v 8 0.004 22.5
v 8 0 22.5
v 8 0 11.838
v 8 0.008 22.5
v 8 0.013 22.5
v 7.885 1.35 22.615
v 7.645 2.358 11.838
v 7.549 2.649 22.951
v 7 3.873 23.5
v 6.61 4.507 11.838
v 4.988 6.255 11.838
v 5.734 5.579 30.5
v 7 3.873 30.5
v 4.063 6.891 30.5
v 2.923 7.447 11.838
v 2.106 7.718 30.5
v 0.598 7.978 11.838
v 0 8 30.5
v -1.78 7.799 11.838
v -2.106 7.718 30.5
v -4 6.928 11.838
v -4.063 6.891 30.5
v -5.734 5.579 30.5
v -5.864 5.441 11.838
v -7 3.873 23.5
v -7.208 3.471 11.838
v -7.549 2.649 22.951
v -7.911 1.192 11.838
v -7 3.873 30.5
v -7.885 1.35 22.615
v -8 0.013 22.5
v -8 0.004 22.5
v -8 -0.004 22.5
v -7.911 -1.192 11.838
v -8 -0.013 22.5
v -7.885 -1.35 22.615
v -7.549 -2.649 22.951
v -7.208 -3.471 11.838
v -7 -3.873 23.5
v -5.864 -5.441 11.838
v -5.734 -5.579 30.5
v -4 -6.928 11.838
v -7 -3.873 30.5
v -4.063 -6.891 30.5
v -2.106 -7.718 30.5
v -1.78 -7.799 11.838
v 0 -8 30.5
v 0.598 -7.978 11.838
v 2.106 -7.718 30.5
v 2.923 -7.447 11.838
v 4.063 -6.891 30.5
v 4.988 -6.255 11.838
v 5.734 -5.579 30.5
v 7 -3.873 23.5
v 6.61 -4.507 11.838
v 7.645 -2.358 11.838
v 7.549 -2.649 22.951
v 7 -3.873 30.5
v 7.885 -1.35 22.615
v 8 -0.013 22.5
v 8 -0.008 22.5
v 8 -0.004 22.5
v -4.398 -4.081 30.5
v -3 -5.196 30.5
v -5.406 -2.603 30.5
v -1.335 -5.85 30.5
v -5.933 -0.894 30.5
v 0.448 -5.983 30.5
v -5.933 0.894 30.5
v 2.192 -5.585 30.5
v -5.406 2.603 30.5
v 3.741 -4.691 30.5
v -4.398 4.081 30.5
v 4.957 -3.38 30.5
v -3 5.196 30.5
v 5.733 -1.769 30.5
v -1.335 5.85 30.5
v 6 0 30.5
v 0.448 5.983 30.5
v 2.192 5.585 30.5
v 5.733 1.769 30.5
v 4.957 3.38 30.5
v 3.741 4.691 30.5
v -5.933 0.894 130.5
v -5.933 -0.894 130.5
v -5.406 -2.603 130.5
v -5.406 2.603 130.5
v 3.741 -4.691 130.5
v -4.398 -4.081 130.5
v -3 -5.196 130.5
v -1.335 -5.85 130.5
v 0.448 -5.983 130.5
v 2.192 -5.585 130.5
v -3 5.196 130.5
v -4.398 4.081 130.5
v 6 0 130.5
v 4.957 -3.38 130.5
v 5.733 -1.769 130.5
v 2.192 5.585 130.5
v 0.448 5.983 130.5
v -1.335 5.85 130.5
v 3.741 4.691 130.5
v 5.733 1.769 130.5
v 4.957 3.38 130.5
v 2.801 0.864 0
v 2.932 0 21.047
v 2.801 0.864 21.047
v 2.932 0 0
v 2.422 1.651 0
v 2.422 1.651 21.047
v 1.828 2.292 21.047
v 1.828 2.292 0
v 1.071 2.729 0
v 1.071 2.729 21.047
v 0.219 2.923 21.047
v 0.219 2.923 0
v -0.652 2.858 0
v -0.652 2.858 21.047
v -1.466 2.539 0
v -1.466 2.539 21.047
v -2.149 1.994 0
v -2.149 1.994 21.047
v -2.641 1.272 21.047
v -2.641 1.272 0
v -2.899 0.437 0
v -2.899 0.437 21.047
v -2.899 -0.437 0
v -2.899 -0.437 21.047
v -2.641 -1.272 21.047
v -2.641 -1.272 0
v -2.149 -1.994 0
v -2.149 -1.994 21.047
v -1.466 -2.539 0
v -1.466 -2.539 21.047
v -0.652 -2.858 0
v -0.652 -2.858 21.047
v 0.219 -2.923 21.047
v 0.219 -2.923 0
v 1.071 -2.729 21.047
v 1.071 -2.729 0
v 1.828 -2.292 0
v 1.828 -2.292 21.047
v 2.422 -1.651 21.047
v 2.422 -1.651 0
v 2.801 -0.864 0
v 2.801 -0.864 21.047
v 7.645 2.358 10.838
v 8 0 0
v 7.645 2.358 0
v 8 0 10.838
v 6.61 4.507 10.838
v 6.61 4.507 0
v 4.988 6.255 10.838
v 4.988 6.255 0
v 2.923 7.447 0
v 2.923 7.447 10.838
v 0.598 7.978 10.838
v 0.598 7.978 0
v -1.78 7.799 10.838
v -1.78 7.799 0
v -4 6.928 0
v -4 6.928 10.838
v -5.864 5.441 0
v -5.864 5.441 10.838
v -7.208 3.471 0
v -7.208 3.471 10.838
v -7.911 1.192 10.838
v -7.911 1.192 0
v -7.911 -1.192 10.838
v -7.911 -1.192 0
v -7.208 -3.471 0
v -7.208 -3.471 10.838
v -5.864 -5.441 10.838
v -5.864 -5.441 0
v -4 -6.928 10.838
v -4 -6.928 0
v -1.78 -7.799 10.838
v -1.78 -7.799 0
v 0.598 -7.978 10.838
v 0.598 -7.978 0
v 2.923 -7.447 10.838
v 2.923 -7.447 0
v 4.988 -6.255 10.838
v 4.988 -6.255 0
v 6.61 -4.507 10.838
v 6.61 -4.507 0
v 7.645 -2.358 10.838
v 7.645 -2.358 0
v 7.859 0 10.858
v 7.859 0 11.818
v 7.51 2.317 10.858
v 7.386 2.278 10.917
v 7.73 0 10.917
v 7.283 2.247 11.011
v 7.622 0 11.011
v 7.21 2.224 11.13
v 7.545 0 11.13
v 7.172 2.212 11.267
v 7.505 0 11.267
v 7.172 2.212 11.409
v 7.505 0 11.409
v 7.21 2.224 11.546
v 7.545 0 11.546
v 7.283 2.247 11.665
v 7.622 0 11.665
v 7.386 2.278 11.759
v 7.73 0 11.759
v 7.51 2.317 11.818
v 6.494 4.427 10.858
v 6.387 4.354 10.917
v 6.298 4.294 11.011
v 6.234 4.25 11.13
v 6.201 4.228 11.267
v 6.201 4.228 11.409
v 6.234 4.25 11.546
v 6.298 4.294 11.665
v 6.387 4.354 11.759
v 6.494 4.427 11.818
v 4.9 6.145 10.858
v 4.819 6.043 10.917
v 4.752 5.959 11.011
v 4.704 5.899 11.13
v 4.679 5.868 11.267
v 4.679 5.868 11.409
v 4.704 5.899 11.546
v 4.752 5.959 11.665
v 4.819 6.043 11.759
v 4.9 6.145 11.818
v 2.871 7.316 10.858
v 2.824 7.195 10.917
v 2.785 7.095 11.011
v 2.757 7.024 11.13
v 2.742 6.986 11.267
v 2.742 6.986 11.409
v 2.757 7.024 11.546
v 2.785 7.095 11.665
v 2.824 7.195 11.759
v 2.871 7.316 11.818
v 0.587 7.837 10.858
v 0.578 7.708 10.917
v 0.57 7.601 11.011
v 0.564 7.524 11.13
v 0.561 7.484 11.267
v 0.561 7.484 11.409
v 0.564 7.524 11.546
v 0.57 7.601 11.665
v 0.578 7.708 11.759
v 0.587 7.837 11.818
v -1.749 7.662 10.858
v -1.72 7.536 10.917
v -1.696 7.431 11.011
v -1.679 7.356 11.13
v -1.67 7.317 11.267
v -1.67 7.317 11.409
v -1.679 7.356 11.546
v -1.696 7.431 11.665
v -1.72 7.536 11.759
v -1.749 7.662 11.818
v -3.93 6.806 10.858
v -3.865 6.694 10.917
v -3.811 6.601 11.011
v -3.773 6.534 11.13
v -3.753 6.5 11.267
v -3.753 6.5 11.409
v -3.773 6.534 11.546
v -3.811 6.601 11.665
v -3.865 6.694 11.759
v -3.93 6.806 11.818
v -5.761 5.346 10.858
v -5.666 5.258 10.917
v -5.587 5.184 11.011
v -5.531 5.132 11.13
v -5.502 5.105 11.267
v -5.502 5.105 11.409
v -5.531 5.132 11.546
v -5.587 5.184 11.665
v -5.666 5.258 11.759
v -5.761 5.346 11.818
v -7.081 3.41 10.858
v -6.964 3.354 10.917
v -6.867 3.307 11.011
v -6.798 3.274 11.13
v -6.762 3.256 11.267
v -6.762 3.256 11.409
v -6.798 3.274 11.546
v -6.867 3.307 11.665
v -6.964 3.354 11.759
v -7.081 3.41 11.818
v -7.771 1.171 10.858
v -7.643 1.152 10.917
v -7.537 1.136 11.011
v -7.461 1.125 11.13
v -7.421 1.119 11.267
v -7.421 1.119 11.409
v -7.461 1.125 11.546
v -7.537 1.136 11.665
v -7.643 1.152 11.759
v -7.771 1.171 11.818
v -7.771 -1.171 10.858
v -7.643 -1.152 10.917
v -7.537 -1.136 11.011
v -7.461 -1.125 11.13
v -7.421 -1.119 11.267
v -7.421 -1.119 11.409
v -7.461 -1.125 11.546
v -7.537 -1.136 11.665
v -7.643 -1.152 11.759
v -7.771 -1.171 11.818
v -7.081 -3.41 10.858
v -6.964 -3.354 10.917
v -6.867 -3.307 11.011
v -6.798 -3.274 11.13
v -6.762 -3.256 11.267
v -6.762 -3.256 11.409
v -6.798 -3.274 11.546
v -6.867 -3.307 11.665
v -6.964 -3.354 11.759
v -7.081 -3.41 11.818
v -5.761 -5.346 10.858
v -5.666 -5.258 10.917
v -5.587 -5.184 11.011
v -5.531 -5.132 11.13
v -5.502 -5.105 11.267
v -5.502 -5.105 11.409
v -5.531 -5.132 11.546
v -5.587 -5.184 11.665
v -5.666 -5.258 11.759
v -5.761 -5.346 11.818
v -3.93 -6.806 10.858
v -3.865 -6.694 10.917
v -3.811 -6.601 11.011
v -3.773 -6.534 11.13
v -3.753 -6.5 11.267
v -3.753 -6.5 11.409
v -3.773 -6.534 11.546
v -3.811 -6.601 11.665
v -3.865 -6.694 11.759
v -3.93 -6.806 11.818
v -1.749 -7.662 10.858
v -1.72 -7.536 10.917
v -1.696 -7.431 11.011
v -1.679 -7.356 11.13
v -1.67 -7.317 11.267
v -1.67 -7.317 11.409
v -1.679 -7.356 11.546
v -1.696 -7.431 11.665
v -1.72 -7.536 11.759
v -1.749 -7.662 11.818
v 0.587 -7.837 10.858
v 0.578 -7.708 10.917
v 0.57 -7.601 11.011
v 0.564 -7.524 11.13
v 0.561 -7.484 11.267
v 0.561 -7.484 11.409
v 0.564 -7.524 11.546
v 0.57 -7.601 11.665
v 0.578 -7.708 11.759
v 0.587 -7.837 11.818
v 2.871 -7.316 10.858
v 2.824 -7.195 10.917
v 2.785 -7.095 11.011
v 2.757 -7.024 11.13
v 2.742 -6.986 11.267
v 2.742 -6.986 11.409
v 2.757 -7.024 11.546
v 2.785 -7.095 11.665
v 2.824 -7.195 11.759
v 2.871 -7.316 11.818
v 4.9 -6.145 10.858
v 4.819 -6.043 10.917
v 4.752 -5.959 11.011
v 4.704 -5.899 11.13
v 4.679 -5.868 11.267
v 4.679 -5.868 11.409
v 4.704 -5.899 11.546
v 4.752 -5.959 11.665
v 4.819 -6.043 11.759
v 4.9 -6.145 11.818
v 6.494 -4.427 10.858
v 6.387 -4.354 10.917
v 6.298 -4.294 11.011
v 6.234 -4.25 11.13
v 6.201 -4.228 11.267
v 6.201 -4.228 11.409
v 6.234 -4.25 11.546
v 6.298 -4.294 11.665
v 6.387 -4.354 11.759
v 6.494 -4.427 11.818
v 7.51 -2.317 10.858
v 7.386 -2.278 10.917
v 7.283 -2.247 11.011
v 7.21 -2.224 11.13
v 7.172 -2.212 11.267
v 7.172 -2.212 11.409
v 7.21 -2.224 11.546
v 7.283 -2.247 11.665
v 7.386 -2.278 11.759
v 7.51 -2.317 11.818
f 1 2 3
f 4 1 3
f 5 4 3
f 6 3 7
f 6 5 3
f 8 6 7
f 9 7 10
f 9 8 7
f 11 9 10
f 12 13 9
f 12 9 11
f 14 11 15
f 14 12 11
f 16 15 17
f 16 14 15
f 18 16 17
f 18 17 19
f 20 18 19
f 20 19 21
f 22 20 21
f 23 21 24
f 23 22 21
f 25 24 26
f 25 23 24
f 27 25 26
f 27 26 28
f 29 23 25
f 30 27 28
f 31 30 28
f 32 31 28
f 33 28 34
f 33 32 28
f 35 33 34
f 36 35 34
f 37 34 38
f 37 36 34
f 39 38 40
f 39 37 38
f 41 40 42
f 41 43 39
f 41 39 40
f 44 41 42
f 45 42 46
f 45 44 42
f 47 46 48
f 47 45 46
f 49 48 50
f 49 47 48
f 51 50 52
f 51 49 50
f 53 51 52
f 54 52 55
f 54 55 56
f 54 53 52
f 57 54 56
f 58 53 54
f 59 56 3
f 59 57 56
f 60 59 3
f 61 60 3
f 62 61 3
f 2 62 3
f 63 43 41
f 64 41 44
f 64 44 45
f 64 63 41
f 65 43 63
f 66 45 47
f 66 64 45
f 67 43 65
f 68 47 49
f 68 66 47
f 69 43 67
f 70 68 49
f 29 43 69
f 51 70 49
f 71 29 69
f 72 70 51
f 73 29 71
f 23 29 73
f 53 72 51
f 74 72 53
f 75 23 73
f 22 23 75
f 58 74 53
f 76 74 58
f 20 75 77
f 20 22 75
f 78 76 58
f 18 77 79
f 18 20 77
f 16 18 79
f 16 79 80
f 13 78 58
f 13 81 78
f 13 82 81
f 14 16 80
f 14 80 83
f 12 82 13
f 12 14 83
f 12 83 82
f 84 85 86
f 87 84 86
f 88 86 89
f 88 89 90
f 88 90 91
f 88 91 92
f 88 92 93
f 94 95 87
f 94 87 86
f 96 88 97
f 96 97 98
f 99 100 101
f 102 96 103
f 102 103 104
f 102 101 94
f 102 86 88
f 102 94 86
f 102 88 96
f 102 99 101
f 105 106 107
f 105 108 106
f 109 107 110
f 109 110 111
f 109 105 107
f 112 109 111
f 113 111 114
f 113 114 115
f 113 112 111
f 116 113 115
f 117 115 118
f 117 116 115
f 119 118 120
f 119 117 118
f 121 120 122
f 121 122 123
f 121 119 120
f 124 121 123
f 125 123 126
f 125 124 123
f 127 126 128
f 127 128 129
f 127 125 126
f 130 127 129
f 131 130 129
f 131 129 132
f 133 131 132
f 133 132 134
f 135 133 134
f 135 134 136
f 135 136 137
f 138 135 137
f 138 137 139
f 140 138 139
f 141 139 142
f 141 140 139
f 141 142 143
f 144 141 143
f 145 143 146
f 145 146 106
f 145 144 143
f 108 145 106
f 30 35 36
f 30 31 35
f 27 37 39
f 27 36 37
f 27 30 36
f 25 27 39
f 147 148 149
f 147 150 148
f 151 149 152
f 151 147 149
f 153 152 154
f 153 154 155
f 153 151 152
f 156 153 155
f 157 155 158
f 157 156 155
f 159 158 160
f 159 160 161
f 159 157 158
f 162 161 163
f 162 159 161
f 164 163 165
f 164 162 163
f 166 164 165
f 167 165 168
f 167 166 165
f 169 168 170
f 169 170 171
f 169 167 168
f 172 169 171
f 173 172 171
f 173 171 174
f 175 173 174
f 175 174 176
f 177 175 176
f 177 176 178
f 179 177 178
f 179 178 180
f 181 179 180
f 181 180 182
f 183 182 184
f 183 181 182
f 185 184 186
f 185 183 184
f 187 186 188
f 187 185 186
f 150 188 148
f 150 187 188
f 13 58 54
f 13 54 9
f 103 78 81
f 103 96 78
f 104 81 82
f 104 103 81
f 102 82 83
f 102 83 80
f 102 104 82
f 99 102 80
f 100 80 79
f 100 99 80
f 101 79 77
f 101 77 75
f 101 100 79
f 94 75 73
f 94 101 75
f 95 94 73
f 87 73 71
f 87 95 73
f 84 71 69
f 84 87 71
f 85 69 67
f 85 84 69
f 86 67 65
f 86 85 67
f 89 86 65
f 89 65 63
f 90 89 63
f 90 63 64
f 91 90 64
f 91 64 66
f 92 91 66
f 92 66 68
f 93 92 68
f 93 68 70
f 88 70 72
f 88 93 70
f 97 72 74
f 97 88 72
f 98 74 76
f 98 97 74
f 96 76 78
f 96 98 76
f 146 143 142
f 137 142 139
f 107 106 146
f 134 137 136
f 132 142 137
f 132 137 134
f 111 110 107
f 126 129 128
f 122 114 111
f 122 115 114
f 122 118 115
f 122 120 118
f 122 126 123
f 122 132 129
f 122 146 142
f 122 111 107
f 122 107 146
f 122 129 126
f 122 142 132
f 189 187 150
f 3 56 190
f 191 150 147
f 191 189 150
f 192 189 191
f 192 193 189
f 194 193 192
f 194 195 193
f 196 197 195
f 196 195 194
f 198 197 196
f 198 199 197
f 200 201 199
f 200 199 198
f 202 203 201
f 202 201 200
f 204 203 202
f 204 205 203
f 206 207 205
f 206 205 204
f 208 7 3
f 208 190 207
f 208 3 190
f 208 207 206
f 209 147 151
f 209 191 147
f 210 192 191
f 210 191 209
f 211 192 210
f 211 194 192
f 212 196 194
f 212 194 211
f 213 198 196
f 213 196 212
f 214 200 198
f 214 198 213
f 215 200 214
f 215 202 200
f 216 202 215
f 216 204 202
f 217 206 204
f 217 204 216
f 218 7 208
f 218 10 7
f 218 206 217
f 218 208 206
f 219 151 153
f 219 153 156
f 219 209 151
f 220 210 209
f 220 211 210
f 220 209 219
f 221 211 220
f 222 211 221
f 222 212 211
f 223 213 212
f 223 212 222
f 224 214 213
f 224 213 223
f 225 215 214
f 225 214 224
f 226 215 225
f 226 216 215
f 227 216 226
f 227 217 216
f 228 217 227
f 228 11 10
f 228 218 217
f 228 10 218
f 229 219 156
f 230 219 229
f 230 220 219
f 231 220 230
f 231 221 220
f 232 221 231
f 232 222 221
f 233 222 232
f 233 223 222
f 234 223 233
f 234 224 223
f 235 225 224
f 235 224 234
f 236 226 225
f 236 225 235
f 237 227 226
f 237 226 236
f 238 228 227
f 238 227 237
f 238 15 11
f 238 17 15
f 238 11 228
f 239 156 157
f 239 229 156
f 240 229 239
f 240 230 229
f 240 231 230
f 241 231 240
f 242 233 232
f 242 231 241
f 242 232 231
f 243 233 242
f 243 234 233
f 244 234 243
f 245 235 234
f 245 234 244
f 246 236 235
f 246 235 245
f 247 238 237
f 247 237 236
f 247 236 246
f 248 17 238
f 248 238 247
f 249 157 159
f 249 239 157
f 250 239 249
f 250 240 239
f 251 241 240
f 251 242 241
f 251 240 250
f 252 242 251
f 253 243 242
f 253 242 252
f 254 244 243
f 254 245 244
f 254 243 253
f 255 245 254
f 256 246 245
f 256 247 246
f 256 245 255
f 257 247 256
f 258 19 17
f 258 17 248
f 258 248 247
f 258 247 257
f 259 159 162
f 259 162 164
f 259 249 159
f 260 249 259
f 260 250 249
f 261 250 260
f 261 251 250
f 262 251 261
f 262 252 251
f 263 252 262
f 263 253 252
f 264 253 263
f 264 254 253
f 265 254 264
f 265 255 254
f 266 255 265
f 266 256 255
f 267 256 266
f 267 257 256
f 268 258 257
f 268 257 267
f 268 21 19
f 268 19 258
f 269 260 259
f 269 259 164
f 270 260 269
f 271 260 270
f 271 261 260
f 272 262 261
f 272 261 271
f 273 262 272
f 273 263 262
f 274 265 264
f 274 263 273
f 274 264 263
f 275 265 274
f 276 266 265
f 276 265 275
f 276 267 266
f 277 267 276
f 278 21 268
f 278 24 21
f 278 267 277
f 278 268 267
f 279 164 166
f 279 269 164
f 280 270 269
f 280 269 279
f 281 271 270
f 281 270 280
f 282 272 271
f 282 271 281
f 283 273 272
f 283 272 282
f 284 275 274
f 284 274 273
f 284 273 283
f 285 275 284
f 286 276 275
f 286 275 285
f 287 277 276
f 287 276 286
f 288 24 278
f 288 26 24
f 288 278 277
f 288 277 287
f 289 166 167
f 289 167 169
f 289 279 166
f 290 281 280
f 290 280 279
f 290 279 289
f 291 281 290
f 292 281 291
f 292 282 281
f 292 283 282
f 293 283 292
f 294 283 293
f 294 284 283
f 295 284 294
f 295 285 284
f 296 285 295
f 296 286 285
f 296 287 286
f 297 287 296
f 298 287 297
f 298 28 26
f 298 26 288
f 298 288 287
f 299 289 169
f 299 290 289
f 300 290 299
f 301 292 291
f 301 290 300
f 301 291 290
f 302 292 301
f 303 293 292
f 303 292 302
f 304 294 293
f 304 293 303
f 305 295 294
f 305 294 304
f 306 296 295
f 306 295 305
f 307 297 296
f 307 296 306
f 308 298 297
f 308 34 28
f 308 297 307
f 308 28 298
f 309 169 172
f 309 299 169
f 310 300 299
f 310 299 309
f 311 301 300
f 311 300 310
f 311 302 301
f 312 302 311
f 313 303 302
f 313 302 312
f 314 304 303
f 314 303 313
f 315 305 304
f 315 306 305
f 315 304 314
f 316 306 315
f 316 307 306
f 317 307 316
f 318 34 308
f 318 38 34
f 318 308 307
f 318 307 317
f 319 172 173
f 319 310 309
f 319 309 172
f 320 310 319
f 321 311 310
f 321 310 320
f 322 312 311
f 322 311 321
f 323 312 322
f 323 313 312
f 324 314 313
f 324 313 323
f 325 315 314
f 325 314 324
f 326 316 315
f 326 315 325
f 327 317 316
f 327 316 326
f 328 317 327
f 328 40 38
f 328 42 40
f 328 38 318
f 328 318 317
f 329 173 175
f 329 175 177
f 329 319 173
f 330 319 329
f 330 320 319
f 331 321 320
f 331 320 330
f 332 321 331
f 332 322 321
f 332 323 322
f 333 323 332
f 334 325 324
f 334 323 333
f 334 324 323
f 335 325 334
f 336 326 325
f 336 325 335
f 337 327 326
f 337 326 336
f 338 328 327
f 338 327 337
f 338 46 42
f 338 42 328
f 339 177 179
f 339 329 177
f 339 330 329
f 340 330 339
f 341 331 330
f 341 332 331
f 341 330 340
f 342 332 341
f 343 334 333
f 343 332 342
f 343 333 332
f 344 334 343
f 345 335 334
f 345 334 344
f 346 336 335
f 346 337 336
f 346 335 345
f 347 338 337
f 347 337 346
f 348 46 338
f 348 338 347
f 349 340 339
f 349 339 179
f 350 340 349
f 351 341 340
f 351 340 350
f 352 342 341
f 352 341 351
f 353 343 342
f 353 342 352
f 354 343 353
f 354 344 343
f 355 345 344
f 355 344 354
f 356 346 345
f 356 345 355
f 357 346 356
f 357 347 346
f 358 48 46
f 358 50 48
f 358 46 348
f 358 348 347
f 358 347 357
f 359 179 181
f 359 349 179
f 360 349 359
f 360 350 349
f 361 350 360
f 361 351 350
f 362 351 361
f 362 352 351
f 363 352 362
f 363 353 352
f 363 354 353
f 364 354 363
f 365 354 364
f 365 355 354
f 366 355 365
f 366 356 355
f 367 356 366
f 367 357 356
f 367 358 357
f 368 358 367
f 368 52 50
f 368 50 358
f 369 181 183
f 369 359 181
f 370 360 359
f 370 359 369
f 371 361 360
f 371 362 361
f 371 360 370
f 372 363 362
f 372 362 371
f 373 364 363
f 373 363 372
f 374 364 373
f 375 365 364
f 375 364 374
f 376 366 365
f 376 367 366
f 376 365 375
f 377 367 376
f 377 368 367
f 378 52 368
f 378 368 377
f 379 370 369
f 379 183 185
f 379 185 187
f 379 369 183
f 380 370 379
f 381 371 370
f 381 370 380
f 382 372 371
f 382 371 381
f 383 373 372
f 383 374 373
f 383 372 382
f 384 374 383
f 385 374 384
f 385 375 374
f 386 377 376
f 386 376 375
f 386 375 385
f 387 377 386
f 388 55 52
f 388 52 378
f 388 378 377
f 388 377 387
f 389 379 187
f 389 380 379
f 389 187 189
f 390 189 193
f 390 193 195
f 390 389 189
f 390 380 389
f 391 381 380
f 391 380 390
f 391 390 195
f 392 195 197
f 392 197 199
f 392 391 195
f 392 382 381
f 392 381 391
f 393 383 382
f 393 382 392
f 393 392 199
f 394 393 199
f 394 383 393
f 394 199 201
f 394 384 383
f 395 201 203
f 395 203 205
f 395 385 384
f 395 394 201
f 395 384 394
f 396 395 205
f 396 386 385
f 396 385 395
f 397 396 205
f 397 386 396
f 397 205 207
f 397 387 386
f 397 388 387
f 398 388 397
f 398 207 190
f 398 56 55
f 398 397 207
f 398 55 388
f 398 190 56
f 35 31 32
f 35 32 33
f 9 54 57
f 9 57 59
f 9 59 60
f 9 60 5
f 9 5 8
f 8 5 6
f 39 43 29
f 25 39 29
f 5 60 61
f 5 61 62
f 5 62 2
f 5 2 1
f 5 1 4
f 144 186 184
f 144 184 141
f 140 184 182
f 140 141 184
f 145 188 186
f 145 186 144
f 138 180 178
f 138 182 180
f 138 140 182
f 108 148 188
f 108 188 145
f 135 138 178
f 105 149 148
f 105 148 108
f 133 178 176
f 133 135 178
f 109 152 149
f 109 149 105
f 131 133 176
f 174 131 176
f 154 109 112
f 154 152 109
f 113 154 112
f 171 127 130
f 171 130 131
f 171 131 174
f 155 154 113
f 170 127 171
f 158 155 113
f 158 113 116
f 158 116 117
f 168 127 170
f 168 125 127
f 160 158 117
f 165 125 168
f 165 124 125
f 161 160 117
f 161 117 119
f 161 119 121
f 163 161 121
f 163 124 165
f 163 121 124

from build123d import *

# Parameters (mm, degrees)
F2_W     = 19.6017324924
F2_H     = 37.1457748115
F2_W_2   = 14
F2_H_2   = 30
F3_DEPTH = 8
F4_SIZE  = 0.99999


# Not quite as in the source:
# - a fillet or chamfer is up to 0.001 mm smaller than in the source, because OpenCascade refuses the exact size


with BuildPart() as f1:
    # F0 (on Front) → F1 (revolve)
    with BuildSketch(Plane.XZ):
        with BuildLine():
            Line((2.9315422289, 21.0469197482), (2.9315422289, 0))
            Line((2.9315422289, 0), (8, 0))
            Line((8, 0), (8, 10.8380244002))
            ThreePointArc((8, 10.8380244002), (7.5, 11.3380244002), (8, 11.8380244002))
            Line((8, 11.8380244002), (8, 30.5))
            Line((8, 30.5), (6, 30.5))
            Line((6, 30.5), (6, 130.5))
            Line((6, 130.5), (0, 130.5))
            Line((0, 130.5), (0, 30.5))
            Line((0, 30.5), (0, 21.0469197482))
            Line((0, 21.0469197482), (2.9315422289, 21.0469197482))
        make_face()
    revolve(axis=Axis((0, 0, 80.5), (0, 0, 1)))

    # F2 (on face) → F3 (cut)
    with BuildSketch(Plane.XY.offset(30.5)):
        Rectangle(F2_W, F2_H)
        Rectangle(F2_W_2, F2_H_2, mode=Mode.SUBTRACT)
    extrude(amount=-F3_DEPTH, mode=Mode.SUBTRACT)

    # F4 (size 1 in the source; OpenCascade refuses exactly that, so slightly less here)
    f4_edges = [f1.edges().sort_by_distance(p)[0] for p in [
        (-7, 0, 22.5),
        (7, 0, 22.5),
    ]]
    chamfer(f4_edges, length=F4_SIZE)


solid = f1.part
